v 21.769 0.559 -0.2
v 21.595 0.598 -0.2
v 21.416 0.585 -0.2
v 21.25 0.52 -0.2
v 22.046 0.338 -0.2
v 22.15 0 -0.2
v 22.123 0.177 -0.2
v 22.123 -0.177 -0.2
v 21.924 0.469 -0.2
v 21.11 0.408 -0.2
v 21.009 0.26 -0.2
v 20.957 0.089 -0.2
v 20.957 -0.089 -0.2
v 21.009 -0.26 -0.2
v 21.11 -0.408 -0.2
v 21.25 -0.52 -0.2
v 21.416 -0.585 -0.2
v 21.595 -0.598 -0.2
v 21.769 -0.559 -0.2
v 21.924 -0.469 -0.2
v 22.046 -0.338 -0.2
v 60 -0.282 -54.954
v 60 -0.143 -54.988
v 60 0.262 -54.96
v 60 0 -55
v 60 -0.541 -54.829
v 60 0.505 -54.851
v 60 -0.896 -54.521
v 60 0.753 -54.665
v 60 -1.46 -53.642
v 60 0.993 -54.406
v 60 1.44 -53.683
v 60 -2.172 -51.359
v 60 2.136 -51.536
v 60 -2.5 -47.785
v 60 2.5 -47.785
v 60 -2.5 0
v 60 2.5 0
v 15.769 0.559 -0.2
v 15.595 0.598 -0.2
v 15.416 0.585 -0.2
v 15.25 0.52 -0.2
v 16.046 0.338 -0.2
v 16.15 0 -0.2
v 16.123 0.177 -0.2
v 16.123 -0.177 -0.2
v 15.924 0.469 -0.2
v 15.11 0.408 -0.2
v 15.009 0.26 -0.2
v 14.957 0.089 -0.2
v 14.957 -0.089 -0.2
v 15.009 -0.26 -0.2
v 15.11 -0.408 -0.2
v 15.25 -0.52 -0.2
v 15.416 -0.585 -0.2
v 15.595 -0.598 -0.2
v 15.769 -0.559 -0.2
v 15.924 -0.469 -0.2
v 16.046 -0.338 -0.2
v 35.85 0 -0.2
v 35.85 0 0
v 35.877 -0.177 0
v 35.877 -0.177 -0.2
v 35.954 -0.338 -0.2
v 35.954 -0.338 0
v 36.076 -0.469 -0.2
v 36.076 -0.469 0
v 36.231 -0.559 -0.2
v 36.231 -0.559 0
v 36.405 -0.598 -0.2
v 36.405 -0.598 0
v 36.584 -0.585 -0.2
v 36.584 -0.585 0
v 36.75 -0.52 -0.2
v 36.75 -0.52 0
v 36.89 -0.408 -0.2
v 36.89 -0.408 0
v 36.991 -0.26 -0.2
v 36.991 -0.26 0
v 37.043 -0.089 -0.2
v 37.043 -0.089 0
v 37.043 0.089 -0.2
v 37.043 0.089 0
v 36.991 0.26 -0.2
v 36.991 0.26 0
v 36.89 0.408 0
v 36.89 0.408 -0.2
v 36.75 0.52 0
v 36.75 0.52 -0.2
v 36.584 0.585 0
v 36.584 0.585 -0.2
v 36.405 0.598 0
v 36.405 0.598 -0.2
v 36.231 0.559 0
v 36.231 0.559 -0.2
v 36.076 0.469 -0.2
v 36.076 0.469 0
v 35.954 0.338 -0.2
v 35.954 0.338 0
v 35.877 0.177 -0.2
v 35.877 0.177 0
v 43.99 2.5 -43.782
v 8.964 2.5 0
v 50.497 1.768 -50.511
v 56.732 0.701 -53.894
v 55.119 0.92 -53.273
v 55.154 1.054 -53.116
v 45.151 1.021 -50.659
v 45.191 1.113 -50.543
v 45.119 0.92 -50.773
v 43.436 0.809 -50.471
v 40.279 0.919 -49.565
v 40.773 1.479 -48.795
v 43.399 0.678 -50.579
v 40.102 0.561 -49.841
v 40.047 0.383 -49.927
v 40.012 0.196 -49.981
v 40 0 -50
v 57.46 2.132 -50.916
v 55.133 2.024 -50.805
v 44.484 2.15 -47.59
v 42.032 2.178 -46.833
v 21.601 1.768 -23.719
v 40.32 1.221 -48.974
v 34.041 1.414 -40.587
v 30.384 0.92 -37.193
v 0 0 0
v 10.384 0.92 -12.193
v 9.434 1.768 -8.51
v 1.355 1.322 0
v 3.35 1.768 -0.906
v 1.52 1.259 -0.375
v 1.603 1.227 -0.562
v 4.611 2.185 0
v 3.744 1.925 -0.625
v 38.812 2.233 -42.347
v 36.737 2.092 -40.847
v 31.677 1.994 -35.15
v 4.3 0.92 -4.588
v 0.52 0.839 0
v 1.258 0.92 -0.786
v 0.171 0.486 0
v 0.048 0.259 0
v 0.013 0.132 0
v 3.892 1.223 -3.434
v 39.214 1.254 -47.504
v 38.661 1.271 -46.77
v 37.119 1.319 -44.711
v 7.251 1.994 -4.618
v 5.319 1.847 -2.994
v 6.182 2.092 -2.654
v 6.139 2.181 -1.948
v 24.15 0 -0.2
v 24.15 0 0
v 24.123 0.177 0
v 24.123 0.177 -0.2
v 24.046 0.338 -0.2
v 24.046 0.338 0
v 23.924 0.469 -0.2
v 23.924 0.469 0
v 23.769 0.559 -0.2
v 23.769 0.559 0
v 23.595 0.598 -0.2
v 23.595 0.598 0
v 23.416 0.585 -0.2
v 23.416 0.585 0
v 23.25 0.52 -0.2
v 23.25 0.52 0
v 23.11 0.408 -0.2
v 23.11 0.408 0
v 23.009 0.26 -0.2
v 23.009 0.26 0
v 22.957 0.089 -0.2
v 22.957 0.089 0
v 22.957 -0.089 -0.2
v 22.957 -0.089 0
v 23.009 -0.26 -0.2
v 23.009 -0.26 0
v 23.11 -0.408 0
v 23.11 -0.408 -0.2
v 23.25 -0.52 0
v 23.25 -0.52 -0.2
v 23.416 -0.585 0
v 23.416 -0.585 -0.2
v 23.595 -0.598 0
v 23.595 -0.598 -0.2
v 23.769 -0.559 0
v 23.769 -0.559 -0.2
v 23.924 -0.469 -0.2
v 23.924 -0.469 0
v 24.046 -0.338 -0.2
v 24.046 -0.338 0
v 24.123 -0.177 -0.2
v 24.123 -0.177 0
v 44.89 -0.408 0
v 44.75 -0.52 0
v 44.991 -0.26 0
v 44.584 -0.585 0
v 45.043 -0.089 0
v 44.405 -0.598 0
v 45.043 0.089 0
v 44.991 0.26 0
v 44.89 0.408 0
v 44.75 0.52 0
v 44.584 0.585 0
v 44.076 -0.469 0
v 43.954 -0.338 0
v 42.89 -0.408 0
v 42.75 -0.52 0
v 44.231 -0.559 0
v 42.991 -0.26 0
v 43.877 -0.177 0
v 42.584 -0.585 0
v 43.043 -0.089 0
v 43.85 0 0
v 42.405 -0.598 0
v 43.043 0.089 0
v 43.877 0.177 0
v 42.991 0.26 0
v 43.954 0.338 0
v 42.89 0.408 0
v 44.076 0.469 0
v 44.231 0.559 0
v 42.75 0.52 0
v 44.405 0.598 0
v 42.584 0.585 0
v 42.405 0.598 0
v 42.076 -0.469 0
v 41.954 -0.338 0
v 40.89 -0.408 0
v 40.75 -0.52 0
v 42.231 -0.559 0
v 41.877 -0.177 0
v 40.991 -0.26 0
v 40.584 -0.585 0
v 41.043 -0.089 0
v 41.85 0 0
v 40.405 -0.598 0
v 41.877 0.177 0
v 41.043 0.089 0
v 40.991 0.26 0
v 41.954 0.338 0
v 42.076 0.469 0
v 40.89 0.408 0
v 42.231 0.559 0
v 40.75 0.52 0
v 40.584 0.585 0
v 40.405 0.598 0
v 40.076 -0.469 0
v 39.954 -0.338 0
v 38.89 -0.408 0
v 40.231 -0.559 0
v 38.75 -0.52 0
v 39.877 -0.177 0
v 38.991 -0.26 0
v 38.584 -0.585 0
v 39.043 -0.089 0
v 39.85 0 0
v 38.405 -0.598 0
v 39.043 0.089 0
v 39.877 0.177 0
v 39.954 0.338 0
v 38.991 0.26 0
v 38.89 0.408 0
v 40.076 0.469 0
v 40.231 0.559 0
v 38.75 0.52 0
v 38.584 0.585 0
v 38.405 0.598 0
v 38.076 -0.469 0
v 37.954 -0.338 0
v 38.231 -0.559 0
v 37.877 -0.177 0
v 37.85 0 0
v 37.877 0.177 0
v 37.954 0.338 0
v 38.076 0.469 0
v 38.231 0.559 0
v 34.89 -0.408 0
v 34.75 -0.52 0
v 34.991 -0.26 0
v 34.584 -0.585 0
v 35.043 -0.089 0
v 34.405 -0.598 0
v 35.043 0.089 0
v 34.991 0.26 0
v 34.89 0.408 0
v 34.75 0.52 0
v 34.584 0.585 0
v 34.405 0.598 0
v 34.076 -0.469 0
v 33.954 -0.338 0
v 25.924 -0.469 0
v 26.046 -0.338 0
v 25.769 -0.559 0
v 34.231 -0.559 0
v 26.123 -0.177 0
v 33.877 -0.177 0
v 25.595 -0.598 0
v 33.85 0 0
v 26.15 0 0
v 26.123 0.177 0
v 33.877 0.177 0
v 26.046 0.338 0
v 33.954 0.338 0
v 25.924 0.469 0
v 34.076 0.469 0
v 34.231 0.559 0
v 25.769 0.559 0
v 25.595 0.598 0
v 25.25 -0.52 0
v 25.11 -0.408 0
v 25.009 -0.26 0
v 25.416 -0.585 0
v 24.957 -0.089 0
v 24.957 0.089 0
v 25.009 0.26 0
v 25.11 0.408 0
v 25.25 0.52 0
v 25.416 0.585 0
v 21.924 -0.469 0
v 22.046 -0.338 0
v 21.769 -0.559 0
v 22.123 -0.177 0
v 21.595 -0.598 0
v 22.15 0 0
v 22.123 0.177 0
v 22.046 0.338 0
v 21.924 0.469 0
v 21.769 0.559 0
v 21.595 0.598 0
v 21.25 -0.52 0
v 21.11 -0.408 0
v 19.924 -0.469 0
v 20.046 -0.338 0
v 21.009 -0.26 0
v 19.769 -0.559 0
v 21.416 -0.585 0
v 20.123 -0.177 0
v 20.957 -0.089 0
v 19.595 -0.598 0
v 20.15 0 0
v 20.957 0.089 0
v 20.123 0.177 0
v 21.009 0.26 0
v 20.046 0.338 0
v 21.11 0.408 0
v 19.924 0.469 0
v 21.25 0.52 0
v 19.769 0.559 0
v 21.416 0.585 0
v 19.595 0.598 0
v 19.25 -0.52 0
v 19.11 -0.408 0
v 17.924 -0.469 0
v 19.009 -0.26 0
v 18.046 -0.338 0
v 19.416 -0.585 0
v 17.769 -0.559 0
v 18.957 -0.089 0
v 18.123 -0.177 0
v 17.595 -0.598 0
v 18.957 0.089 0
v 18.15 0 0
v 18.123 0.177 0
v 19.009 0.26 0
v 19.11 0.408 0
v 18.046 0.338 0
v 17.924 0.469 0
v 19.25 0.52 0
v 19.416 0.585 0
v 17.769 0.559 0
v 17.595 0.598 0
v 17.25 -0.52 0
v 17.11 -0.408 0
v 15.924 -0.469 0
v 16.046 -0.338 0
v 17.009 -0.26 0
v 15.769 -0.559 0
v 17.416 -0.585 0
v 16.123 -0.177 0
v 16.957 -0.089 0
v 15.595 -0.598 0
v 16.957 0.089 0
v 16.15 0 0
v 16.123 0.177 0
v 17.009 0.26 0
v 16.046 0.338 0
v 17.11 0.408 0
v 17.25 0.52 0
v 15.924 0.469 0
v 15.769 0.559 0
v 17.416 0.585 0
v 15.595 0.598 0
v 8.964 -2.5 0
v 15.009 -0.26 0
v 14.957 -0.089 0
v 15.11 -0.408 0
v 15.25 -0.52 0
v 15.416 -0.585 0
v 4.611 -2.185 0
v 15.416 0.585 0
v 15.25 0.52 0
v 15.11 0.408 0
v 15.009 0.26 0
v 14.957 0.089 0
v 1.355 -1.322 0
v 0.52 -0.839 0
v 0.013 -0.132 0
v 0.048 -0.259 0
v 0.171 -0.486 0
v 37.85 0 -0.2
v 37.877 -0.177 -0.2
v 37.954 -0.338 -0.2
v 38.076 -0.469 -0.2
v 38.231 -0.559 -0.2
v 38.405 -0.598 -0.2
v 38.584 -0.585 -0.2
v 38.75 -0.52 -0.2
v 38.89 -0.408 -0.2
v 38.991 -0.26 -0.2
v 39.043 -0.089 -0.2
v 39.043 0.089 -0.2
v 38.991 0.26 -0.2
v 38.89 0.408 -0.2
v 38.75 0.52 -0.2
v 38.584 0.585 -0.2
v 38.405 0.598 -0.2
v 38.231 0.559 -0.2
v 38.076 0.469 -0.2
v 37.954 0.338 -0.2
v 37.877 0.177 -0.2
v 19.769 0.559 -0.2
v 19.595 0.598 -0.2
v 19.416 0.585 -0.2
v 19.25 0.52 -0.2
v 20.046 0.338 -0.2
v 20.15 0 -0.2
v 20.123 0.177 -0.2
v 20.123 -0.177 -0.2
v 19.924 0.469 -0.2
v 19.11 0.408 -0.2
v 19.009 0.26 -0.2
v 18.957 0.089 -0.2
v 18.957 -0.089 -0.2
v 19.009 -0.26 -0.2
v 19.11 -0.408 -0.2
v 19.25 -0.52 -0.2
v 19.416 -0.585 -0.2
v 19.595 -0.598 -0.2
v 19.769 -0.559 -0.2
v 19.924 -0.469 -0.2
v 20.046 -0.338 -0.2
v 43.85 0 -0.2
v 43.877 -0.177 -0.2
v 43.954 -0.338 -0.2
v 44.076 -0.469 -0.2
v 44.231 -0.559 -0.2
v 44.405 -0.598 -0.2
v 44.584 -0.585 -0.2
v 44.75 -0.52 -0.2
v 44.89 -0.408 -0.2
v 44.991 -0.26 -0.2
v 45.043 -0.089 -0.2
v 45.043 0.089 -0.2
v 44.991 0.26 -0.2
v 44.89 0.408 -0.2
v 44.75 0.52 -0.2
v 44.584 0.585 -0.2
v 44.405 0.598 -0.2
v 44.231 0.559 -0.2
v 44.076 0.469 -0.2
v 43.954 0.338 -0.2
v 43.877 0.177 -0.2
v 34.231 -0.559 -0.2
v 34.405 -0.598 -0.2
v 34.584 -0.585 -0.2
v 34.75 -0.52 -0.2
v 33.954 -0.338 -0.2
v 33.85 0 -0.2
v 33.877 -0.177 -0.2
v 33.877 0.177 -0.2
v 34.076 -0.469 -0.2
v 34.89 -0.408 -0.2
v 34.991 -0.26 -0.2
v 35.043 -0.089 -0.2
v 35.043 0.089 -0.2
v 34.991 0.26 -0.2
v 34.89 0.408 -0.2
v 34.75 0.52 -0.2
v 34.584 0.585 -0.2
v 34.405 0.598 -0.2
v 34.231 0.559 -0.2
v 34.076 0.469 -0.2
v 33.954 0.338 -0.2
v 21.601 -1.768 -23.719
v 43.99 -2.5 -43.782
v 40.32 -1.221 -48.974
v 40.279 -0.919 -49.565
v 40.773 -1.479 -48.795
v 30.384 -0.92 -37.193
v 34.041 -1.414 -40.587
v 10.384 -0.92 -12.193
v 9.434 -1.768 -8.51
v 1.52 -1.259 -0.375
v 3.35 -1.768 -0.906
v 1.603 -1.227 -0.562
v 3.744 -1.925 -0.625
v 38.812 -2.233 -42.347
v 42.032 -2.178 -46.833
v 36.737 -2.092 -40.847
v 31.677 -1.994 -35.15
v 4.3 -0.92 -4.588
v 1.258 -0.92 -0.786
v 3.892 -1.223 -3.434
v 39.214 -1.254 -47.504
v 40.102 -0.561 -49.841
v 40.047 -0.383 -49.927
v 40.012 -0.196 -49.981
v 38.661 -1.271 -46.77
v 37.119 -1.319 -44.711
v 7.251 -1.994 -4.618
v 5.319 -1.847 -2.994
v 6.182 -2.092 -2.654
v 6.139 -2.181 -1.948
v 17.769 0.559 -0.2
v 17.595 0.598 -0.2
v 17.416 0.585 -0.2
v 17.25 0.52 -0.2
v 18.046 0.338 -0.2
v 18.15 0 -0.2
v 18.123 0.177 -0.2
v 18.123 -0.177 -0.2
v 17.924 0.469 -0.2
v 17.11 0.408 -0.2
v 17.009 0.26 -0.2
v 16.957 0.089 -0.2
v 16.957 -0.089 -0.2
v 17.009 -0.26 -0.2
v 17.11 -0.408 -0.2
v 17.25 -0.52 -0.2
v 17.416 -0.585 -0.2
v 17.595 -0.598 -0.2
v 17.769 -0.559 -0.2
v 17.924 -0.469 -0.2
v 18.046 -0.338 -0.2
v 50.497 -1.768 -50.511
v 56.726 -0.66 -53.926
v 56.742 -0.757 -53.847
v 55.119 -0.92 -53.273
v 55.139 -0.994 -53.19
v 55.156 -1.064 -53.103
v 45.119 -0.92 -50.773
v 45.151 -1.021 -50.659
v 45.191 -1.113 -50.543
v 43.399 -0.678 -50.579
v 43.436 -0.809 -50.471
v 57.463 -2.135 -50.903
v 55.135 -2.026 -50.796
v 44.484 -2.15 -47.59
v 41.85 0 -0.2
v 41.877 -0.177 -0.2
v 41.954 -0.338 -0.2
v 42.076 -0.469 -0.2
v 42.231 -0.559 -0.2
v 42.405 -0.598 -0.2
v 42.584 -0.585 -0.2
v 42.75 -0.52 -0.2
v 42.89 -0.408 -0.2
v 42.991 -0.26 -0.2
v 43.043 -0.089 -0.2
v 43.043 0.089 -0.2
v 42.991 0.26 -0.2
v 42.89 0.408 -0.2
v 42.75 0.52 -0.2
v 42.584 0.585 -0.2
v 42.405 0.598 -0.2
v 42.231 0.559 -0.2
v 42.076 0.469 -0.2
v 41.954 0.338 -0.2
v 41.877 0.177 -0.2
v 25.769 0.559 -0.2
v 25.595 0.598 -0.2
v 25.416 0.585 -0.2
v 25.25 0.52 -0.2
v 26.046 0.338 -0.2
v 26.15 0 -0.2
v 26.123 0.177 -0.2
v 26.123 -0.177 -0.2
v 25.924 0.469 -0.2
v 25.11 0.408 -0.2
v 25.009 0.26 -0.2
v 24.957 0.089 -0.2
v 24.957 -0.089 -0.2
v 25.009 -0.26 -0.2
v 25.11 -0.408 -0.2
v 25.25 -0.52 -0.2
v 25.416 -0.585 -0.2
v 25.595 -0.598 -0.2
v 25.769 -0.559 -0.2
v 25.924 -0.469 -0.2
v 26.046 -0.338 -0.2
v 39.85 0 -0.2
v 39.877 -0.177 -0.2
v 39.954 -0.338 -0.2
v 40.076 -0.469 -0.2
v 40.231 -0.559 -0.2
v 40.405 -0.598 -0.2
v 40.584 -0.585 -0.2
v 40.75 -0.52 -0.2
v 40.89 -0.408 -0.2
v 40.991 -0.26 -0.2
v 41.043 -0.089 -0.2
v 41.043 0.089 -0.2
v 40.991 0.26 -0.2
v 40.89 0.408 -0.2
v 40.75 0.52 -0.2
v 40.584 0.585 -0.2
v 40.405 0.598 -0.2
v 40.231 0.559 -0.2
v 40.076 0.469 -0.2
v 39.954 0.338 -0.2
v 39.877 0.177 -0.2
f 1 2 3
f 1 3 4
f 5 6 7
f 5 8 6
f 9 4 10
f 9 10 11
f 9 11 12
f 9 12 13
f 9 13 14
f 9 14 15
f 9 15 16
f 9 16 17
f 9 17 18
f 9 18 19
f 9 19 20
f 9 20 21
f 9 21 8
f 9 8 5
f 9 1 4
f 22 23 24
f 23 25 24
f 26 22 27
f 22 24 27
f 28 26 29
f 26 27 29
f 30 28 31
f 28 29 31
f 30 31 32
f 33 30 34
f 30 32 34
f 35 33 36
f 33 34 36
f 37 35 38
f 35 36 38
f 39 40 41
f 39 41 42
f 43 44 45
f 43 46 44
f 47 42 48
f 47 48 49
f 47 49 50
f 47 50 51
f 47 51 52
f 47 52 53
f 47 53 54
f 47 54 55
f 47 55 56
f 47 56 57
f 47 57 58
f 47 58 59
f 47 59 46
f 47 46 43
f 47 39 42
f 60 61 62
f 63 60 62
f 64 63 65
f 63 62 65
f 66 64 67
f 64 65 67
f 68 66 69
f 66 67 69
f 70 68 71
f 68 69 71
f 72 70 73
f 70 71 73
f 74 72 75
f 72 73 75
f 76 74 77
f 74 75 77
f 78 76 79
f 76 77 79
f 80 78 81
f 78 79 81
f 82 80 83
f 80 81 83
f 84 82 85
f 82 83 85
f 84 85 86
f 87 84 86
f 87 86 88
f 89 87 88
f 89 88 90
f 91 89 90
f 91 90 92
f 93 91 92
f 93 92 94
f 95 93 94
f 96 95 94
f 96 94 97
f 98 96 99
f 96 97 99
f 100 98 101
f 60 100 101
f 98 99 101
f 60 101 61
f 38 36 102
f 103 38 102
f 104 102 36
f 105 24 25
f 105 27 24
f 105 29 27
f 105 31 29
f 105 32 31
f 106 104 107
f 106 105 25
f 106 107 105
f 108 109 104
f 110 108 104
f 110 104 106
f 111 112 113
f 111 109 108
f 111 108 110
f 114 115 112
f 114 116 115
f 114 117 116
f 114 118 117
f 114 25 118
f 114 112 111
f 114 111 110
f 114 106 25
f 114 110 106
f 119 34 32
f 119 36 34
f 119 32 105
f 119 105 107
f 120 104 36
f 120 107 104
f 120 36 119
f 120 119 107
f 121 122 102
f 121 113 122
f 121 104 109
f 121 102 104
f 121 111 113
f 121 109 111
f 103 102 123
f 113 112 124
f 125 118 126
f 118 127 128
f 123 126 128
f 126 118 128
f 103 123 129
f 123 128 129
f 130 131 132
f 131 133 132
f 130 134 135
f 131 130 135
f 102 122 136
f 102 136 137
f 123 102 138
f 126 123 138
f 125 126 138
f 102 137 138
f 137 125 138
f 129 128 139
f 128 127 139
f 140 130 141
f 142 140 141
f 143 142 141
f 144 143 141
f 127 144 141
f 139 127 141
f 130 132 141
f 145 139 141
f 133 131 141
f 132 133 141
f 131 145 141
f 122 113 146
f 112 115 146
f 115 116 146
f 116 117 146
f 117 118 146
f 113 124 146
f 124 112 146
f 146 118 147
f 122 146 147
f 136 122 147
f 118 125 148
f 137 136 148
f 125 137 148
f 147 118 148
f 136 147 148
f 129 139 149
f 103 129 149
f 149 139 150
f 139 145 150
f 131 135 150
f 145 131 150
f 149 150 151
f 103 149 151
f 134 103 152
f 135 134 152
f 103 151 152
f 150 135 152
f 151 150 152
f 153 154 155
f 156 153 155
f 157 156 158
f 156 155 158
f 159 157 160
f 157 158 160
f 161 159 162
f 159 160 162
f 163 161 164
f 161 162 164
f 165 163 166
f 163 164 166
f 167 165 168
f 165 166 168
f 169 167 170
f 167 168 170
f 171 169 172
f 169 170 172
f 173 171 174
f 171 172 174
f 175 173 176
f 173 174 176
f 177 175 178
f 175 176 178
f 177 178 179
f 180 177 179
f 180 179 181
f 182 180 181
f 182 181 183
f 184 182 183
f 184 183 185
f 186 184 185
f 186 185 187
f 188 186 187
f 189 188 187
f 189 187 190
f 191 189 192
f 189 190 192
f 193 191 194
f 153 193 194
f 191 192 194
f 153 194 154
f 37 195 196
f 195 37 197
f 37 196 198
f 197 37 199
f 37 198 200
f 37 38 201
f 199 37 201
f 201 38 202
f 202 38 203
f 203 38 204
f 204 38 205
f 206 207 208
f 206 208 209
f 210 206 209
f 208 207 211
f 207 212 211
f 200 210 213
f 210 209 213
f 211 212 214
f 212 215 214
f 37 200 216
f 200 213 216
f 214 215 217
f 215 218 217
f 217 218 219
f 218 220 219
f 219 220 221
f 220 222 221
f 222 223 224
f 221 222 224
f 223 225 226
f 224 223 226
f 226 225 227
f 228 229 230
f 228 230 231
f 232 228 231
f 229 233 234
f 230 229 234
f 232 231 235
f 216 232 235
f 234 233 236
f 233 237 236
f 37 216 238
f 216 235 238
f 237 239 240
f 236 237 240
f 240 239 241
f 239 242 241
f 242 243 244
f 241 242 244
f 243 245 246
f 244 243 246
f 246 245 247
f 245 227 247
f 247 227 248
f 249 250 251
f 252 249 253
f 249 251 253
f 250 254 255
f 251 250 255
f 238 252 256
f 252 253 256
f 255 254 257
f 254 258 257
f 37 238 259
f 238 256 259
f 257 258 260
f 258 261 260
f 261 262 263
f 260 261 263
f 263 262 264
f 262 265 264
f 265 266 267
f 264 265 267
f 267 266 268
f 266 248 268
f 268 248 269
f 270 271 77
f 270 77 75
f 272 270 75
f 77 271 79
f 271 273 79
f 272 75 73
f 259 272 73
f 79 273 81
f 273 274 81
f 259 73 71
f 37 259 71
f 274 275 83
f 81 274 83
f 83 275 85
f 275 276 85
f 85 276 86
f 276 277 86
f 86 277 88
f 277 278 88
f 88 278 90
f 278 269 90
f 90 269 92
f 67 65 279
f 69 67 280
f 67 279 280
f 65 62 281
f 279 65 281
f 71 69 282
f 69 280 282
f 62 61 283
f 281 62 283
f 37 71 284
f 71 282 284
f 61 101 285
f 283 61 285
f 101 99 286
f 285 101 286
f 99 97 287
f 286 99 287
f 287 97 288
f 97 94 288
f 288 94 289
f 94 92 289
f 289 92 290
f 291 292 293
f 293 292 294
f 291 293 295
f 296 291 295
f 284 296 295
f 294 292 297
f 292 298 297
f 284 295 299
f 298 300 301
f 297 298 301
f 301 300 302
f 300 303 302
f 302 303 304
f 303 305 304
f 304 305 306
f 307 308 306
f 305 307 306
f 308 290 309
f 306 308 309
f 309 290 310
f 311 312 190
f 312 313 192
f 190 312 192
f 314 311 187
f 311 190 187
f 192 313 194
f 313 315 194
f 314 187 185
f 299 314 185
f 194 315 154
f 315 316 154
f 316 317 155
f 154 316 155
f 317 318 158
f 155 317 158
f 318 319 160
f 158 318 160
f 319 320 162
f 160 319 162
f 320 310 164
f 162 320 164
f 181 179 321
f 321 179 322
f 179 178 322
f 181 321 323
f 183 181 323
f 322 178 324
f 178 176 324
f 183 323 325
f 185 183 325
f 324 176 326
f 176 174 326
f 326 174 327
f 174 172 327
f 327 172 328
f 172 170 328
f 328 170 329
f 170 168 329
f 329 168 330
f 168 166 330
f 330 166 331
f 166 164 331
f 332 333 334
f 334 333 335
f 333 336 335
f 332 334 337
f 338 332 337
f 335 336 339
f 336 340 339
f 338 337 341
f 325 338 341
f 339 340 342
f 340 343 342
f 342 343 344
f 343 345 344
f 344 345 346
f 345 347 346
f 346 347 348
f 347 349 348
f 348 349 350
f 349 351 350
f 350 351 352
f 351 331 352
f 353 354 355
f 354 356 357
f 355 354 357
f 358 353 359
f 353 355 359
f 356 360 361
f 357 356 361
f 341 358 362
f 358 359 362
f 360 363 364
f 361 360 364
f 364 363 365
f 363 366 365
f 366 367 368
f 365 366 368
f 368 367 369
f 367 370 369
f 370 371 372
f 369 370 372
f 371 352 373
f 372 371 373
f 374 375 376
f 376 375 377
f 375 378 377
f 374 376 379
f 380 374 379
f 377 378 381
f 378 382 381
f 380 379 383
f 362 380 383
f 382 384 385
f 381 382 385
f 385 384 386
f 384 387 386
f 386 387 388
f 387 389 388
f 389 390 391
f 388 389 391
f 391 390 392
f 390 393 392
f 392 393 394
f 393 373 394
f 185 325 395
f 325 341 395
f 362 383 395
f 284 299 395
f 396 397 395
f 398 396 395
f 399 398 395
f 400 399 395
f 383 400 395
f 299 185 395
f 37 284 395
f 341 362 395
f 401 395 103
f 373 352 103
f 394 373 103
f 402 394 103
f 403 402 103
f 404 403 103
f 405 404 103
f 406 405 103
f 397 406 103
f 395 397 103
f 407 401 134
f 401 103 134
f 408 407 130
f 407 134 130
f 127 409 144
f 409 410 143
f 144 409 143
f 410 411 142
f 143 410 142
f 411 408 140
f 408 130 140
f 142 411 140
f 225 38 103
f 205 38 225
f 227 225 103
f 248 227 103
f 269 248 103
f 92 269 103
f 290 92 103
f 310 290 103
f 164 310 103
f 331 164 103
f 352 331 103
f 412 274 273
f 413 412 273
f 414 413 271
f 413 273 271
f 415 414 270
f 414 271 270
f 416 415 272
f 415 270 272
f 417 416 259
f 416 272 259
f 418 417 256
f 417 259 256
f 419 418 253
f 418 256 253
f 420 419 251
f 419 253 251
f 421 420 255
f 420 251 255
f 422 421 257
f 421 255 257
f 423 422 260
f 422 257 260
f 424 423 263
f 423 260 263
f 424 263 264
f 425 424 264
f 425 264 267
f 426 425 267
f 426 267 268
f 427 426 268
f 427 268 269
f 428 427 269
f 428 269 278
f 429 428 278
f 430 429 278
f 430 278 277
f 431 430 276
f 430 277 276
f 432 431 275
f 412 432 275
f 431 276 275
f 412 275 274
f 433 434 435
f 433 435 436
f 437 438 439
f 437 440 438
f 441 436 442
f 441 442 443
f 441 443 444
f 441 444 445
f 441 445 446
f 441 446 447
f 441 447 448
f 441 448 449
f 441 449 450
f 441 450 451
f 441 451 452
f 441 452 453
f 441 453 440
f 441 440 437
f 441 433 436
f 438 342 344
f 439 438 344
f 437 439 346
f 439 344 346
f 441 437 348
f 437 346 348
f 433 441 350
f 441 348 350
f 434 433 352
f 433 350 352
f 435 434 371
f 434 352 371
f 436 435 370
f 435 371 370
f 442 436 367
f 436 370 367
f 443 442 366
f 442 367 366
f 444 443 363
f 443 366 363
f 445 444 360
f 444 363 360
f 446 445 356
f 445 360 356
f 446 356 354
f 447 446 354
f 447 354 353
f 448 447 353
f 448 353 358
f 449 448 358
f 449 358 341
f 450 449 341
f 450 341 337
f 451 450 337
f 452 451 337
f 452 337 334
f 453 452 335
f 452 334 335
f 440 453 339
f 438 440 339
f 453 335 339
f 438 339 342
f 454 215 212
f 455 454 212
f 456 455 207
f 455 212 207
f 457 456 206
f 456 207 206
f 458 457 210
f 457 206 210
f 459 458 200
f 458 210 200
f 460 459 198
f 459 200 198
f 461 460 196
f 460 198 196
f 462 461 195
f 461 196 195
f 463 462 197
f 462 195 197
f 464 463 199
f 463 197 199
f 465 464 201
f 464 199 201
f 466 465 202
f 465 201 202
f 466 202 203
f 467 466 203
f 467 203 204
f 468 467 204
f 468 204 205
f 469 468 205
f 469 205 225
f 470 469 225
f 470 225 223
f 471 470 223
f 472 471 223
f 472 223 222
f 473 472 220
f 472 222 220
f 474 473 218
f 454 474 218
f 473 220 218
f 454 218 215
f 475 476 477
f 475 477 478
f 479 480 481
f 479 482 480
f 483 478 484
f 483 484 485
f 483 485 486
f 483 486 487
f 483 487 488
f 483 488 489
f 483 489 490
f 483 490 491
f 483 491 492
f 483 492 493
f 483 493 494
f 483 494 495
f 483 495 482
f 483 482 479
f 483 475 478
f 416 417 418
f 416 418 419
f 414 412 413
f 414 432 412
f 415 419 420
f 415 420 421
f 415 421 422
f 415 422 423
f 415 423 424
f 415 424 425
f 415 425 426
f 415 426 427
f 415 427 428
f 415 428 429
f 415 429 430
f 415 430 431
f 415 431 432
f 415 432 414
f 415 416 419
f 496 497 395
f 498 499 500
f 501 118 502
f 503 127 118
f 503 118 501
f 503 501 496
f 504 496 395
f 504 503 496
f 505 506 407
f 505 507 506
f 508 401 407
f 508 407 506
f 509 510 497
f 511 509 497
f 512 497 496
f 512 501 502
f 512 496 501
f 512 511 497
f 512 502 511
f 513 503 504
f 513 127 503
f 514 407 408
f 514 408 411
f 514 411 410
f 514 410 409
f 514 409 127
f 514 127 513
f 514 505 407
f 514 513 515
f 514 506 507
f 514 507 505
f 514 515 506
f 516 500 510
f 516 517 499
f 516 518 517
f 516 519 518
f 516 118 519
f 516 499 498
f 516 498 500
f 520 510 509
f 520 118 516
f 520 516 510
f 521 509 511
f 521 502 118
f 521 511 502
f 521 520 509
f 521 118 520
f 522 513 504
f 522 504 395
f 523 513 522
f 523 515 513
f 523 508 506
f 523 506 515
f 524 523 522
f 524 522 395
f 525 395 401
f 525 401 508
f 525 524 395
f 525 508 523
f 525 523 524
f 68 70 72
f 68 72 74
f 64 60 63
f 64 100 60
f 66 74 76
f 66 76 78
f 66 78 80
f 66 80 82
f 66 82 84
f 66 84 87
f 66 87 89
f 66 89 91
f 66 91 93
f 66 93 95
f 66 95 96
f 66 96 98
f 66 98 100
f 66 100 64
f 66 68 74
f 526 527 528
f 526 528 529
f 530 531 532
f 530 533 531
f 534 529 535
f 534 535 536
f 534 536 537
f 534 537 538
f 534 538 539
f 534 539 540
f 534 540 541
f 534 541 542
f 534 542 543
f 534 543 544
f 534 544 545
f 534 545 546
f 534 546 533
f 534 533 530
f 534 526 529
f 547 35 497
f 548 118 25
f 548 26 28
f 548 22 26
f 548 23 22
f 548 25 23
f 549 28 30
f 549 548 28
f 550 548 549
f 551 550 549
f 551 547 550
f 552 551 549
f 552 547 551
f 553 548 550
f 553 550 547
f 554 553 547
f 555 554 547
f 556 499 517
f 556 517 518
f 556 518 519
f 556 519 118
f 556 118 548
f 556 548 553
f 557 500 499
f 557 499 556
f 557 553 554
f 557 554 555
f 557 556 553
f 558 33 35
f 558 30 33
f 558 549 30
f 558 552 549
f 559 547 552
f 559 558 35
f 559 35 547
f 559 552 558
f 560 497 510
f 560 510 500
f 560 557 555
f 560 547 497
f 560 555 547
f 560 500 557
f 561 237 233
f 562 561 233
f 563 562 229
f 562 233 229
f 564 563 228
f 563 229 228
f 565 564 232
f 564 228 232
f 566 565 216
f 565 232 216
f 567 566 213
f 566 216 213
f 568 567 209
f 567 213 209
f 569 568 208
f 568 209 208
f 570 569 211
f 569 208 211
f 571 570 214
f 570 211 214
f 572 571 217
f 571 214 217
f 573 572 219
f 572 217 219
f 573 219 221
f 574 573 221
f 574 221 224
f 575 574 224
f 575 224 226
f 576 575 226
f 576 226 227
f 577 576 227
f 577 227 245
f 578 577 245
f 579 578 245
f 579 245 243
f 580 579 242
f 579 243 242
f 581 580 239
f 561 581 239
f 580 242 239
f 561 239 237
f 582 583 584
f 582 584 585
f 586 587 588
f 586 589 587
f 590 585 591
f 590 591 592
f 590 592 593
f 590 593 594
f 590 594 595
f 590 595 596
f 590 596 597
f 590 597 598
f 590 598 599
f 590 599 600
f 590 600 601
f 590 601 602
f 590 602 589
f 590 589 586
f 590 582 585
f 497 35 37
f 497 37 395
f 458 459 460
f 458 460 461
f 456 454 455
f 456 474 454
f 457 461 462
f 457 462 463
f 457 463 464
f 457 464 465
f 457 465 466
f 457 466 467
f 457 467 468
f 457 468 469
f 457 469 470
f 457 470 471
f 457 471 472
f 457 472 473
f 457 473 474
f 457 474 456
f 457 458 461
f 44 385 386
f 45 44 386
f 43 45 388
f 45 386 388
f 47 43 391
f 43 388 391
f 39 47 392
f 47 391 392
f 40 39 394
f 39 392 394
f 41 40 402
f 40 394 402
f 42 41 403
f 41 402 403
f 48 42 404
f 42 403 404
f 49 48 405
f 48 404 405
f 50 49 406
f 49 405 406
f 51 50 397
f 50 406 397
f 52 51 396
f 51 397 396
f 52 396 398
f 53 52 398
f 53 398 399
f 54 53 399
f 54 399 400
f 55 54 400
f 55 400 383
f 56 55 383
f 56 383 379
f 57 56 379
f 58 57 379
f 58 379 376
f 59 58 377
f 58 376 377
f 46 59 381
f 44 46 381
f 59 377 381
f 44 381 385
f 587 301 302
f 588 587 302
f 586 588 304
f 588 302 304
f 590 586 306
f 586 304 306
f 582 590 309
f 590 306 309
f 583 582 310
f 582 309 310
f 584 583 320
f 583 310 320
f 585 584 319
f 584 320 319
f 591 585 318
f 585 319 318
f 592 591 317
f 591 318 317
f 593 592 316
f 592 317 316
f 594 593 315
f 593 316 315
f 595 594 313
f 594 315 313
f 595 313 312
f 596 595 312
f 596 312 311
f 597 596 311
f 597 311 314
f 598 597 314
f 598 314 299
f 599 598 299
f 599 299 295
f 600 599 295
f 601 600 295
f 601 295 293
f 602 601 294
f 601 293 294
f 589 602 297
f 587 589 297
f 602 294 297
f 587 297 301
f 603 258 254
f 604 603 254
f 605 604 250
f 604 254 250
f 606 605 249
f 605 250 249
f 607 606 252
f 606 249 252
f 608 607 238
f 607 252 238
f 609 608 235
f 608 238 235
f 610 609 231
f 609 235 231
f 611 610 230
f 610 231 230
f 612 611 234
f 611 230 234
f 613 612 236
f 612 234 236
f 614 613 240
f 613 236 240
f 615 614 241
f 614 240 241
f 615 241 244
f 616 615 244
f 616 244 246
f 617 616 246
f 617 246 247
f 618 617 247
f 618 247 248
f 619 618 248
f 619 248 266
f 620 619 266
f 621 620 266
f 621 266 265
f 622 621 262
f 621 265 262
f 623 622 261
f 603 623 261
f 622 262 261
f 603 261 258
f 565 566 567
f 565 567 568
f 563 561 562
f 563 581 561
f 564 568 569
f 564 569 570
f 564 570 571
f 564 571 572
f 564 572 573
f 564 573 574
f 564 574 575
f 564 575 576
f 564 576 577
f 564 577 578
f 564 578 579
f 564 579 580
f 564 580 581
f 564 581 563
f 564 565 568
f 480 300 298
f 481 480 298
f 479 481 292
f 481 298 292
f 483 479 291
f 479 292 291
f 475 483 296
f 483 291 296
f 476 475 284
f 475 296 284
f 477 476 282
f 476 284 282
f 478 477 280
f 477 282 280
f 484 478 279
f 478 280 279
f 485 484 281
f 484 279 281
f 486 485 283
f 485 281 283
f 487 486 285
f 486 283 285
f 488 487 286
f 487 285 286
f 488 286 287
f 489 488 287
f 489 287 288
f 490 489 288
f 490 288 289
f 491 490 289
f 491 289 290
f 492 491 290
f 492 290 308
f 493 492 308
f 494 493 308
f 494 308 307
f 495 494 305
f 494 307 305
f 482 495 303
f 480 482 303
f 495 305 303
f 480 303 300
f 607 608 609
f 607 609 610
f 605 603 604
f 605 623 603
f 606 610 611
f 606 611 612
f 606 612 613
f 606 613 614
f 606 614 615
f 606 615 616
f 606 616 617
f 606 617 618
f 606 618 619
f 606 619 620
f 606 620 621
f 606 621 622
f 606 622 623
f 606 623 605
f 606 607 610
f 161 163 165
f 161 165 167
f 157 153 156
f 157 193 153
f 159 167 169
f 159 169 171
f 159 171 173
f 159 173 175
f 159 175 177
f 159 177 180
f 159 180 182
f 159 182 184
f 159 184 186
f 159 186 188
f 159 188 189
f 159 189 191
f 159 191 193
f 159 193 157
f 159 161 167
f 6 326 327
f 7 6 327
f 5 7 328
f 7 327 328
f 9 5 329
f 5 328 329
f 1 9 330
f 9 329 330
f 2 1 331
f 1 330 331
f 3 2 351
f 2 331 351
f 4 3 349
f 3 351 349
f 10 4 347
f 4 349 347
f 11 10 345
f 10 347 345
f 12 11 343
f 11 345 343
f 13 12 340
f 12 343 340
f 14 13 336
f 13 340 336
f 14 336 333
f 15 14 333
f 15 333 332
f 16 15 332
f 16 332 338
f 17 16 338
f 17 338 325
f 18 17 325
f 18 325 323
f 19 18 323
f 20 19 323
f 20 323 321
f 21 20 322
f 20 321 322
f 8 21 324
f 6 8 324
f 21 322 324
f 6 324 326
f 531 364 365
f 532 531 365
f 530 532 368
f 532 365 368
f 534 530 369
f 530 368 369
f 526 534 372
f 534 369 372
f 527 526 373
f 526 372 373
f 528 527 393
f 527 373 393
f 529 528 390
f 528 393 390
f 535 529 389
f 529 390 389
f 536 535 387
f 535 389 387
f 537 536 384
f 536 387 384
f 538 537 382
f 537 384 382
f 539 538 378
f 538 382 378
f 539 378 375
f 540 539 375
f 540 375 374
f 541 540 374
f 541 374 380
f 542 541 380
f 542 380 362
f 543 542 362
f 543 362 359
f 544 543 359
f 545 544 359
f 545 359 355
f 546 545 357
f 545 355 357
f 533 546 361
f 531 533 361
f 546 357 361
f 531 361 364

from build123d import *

# Parameters (mm, degrees)
BOSS_EXTRUDE1_DEPTH = 2.5
FILLET3_SIZE        = 2.5
FILLET3_SIZE_2      = 7
FILLET4_SIZE        = 2.5
FILLET4_SIZE_2      = 7
SKETCH2_R           = 0.6
CUT_EXTRUDE1_DEPTH  = 0.2


with BuildPart() as part:
    # Sketch1 → Boss-Extrude1 (new, symmetric)
    with BuildSketch(Plane(origin=(0, 0, 0), x_dir=(1, 0, 0), z_dir=(0, 1, 0))):
        Polygon((0, 0), (40, 50), (60, 55), (60, 0), align=None)
    extrude(amount=BOSS_EXTRUDE1_DEPTH, both=True)

    # Fillet3
    # an asymmetric fillet: 7, 2.5 mm, written as the material it takes off along each edge
    with BuildSketch(Plane(origin=(-10.932163332, 2.5, 13.665204165), x_dir=(0, -1, 0), z_dir=(0.6246950475544242, 0, -0.7808688094430304))) as fillet3_piece_1:
        with BuildLine():
            Bezier((FILLET3_SIZE, 0), (0, 0), (0, -FILLET3_SIZE_2), weights=[1, 0.707106781, 1])
            Line((0, -FILLET3_SIZE_2), (0, 0))
            Line((0, 0), (FILLET3_SIZE, 0))
        make_face()
    extrude(amount=99.031242374, mode=Mode.SUBTRACT)
    with BuildSketch(Plane(origin=(23.022506247, 2.5, -45.755626562), x_dir=(0.24253562503633289, 0, 0.970142500145332), z_dir=(0.970142500145332, 0, -0.2425356250363329))) as fillet3_piece_2:
        with BuildLine():
            Bezier((FILLET3_SIZE_2, 0), (0, 0), (0, FILLET3_SIZE), weights=[1, 0.707106781, 1])
            Line((0, FILLET3_SIZE), (0, 0))
            Line((0, 0), (FILLET3_SIZE_2, 0))
        make_face()
    extrude(amount=55.615528128, mode=Mode.SUBTRACT)

    # Fillet4
    # an asymmetric fillet: 7, 2.5 mm, written as the material it takes off along each edge
    with BuildSketch(Plane(origin=(-10.932163332, -2.5, 13.665204165), x_dir=(0, 1, 0), z_dir=(0.6246950475544242, 0, -0.7808688094430304))) as fillet4_piece_1:
        with BuildLine():
            Bezier((FILLET4_SIZE, 0), (0, 0), (0, FILLET4_SIZE_2), weights=[1, 0.707106781, 1])
            Line((0, FILLET4_SIZE_2), (0, 0))
            Line((0, 0), (FILLET4_SIZE, 0))
        make_face()
    extrude(amount=99.031242374, mode=Mode.SUBTRACT)
    with BuildSketch(Plane(origin=(23.022506247, -2.5, -45.755626562), x_dir=(0, 1, 0), z_dir=(0.970142500145332, 0, -0.2425356250363329))) as fillet4_piece_2:
        with BuildLine():
            Bezier((FILLET4_SIZE, 0), (0, 0), (0, FILLET4_SIZE_2), weights=[1, 0.707106781, 1])
            Line((0, FILLET4_SIZE_2), (0, 0))
            Line((0, 0), (FILLET4_SIZE, 0))
        make_face()
    extrude(amount=55.615528128, mode=Mode.SUBTRACT)

    # Sketch2 → Cut-Extrude1 (cut)
    with BuildSketch(Plane.XY):
        with Locations((15.55, 0)):
            Circle(SKETCH2_R)
        with Locations((17.55, 0)):
            Circle(SKETCH2_R)
        with Locations((19.55, 0)):
            Circle(SKETCH2_R)
        with Locations((21.55, 0)):
            Circle(SKETCH2_R)
        with Locations((23.55, 0)):
            Circle(SKETCH2_R)
        with Locations((25.55, 0)):
            Circle(SKETCH2_R)
        with Locations(Location((34.45, 0, 0), (0, 0, 180))):
            Circle(SKETCH2_R)
        with Locations(Location((36.45, 0, 0), (0, 0, 180))):
            Circle(SKETCH2_R)
        with Locations(Location((38.45, 0, 0), (0, 0, 180))):
            Circle(SKETCH2_R)
        with Locations(Location((40.45, 0, 0), (0, 0, 180))):
            Circle(SKETCH2_R)
        with Locations(Location((42.45, 0, 0), (0, 0, 180))):
            Circle(SKETCH2_R)
        with Locations(Location((44.45, 0, 0), (0, 0, 180))):
            Circle(SKETCH2_R)
    extrude(amount=-CUT_EXTRUDE1_DEPTH, mode=Mode.SUBTRACT)


solid = part.part
